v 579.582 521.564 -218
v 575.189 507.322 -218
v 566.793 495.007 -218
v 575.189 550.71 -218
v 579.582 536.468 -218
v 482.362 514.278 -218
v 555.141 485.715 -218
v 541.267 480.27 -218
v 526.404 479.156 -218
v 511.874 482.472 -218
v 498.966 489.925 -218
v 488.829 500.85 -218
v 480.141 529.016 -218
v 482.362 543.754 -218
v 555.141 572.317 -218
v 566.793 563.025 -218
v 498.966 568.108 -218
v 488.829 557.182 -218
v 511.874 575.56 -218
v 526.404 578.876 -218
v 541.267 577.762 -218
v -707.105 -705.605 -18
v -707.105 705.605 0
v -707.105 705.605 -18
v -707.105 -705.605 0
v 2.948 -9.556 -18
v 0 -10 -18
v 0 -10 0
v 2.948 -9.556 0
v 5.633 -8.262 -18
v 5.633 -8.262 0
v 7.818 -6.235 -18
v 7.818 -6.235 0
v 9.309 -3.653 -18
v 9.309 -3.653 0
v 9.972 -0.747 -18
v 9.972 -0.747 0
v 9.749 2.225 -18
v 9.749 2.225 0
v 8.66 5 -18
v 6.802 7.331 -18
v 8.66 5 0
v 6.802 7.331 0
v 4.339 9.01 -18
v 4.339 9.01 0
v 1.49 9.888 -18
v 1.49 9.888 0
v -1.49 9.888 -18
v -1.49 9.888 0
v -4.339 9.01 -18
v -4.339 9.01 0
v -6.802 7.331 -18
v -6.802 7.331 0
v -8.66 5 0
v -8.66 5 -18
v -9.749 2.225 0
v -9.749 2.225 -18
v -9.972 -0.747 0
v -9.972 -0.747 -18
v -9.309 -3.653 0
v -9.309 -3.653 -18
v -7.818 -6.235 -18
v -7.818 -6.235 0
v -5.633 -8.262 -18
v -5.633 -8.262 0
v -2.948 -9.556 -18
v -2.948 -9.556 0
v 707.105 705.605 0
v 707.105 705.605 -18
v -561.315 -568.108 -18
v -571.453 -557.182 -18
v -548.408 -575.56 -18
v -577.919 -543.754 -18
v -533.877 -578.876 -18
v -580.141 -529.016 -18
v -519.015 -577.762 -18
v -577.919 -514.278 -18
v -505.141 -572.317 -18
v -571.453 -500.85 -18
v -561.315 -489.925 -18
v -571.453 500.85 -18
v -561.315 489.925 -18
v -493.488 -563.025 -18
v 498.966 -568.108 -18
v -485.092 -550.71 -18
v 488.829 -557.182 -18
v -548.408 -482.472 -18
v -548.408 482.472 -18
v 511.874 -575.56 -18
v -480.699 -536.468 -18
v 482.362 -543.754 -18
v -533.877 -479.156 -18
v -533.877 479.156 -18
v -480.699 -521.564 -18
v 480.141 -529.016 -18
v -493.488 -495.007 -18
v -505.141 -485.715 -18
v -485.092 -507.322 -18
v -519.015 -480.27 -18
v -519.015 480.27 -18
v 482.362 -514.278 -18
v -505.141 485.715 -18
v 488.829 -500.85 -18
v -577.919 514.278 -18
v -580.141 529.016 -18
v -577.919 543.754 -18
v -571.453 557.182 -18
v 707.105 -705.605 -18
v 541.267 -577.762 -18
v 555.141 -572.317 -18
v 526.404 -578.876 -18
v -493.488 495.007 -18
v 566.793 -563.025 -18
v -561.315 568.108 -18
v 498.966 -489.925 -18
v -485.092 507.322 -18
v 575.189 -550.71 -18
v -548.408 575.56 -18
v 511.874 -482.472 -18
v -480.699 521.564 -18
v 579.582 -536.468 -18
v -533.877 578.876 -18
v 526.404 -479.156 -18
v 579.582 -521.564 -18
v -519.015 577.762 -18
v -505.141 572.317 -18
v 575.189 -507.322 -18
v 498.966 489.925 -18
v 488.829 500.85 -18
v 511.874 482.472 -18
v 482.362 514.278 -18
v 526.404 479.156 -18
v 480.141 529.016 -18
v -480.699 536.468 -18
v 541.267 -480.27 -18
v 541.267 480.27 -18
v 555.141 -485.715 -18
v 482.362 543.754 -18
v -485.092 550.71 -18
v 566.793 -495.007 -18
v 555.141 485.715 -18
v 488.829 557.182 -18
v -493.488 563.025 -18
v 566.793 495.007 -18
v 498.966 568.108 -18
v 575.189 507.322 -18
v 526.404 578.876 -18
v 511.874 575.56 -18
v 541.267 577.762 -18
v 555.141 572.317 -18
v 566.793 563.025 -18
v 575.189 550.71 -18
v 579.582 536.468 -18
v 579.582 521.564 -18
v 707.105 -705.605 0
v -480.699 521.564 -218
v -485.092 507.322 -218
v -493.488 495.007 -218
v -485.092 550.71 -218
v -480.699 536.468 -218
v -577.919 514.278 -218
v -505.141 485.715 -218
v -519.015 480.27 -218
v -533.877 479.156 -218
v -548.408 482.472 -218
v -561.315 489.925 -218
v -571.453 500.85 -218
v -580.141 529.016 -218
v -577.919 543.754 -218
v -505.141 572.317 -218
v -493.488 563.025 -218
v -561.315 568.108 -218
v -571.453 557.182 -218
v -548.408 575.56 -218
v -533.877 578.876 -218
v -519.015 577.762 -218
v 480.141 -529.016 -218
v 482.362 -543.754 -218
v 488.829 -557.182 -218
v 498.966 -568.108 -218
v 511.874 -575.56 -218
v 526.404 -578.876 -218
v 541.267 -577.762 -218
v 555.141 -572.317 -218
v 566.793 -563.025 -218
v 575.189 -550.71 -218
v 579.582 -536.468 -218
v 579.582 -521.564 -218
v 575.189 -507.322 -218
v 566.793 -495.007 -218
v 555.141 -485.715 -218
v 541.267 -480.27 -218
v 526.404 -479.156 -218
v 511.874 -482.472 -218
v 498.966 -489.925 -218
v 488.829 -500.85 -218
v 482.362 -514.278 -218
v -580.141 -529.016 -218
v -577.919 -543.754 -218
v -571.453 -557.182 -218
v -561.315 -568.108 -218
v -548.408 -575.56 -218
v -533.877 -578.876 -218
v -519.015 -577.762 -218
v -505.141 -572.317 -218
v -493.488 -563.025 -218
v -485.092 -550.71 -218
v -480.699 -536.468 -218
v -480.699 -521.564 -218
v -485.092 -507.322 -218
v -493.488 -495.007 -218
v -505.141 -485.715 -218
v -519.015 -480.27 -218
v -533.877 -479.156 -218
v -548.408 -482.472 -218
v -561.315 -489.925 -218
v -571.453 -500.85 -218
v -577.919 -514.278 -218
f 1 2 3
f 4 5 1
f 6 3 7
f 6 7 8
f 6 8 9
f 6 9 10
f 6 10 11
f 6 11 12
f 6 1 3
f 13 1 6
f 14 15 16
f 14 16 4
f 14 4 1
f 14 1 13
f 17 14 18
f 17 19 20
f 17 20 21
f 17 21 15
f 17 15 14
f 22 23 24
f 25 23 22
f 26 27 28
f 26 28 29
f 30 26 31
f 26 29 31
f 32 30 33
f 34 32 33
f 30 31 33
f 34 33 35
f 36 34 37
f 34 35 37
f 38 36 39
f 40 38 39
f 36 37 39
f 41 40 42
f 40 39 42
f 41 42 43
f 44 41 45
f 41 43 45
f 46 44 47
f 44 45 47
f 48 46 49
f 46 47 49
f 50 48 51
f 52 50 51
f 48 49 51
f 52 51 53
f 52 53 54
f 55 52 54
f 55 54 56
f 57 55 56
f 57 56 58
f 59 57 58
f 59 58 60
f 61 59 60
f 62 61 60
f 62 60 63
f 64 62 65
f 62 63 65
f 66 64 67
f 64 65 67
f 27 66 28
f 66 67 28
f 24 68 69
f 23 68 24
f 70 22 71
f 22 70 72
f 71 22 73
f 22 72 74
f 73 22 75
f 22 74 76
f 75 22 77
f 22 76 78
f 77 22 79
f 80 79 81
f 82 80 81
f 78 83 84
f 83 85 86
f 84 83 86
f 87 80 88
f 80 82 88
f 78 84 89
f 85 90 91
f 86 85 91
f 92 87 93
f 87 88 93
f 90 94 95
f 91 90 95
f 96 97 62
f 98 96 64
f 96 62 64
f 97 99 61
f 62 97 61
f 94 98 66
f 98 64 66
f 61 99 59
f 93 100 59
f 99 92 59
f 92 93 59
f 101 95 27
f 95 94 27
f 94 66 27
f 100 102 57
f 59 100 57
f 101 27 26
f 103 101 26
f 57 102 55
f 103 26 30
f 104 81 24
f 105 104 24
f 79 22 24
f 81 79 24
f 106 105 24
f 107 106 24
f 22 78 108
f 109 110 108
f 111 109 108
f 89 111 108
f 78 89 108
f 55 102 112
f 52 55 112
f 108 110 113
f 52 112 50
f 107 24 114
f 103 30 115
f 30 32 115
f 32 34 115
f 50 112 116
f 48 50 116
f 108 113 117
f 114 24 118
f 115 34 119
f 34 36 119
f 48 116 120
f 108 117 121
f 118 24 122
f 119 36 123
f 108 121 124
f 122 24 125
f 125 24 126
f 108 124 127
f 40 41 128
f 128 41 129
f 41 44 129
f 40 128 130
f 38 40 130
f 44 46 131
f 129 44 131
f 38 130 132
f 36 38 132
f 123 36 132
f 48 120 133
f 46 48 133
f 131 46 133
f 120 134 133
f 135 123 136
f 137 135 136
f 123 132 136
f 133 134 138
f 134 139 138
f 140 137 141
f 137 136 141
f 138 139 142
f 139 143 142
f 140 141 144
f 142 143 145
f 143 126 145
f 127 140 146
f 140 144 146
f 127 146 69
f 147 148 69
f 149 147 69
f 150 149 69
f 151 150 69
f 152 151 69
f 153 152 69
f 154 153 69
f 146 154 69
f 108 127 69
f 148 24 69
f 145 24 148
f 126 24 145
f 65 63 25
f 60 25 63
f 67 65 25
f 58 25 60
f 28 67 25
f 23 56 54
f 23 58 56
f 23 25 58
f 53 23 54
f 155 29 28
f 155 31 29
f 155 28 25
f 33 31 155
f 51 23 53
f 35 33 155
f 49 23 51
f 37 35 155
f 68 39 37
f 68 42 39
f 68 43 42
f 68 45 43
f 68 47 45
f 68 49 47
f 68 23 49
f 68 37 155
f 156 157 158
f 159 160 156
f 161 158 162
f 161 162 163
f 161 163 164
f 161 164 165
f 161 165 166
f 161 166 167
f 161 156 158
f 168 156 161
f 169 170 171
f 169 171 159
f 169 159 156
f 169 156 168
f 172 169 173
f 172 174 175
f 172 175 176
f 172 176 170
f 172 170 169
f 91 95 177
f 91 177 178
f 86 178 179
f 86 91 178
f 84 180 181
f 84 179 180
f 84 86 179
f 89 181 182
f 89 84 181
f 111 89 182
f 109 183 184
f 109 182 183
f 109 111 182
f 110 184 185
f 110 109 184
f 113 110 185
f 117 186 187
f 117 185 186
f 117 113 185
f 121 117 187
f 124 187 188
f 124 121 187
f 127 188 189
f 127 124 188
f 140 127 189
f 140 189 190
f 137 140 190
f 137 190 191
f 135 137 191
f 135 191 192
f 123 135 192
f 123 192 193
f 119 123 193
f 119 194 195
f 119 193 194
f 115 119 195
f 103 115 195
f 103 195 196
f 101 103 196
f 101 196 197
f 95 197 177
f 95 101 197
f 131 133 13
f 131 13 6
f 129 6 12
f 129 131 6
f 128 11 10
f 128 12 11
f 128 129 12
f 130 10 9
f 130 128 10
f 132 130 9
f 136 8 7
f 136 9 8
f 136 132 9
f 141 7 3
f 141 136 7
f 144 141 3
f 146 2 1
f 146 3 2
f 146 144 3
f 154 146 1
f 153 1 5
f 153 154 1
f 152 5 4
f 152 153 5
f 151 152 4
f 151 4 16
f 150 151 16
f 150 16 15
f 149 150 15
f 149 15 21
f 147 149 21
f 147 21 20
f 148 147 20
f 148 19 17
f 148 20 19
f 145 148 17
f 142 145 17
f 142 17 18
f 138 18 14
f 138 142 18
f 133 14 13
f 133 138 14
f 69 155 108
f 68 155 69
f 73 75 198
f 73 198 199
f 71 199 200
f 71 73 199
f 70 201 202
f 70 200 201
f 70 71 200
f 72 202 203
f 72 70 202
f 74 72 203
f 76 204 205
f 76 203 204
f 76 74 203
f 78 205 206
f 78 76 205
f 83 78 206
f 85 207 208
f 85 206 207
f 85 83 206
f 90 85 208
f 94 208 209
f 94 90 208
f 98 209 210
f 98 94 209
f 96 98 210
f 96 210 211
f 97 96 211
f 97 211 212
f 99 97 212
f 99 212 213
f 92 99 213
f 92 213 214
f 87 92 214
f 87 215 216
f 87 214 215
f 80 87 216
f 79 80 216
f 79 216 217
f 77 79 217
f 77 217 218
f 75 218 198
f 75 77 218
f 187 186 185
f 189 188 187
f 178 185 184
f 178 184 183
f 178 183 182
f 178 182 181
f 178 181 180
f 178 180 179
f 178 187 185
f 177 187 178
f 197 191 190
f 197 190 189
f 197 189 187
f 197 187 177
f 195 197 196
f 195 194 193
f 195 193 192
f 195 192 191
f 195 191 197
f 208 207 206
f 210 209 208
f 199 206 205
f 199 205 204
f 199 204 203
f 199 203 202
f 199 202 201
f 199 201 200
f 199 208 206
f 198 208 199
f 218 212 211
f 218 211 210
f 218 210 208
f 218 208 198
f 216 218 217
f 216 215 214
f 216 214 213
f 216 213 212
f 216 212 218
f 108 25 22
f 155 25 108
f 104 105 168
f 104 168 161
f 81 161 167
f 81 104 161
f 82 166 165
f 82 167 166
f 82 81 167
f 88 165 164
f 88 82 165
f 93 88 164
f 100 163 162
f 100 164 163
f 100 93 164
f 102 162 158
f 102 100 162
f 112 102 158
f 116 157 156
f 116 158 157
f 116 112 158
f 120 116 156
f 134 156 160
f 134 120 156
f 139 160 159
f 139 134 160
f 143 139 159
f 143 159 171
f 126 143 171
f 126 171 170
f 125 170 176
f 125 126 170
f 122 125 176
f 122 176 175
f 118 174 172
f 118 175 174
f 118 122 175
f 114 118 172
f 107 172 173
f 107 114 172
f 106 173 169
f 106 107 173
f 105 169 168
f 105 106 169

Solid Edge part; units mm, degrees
sketch "Sketch1" plane through (0, 0, 0) normal (0, 0, 1) x (1, 0, 0)
  line L0 (-707.105, -705.605) -> (707.105, -705.605)
  line L1 (707.105, -705.605) -> (707.105, 705.605)
  line L2 (707.105, 705.605) -> (-707.105, 705.605)
  line L3 (-707.105, 705.605) -> (-707.105, -705.605)
extrude "Protrusion1" add sketch "Sketch1" against normal blind 18
sketch "Sketch2" plane through (0, 0, -18) normal (0, 0, -1) x (-1, 0, 0)
  circle A0 centre (-530.1407, 529.0161) radius 50
  circle A1 centre (530.1407, 529.0161) radius 50
  circle A2 centre (530.1407, -529.0161) radius 50
  circle A3 centre (-530.1407, -529.0161) radius 50
extrude "Kihúzás_2" add sketch "Sketch2" along normal blind 200
sketch "Sketch3" plane through (0, 0, 0) normal (0, 0, 1) x (0, -1, 0)
  circle A0 centre (0, 0) radius 10
extrude "Kivágás_1" cut sketch "Sketch3" along normal mid plane 923.1568
extrude "Kivágás_2" [suppressed]
